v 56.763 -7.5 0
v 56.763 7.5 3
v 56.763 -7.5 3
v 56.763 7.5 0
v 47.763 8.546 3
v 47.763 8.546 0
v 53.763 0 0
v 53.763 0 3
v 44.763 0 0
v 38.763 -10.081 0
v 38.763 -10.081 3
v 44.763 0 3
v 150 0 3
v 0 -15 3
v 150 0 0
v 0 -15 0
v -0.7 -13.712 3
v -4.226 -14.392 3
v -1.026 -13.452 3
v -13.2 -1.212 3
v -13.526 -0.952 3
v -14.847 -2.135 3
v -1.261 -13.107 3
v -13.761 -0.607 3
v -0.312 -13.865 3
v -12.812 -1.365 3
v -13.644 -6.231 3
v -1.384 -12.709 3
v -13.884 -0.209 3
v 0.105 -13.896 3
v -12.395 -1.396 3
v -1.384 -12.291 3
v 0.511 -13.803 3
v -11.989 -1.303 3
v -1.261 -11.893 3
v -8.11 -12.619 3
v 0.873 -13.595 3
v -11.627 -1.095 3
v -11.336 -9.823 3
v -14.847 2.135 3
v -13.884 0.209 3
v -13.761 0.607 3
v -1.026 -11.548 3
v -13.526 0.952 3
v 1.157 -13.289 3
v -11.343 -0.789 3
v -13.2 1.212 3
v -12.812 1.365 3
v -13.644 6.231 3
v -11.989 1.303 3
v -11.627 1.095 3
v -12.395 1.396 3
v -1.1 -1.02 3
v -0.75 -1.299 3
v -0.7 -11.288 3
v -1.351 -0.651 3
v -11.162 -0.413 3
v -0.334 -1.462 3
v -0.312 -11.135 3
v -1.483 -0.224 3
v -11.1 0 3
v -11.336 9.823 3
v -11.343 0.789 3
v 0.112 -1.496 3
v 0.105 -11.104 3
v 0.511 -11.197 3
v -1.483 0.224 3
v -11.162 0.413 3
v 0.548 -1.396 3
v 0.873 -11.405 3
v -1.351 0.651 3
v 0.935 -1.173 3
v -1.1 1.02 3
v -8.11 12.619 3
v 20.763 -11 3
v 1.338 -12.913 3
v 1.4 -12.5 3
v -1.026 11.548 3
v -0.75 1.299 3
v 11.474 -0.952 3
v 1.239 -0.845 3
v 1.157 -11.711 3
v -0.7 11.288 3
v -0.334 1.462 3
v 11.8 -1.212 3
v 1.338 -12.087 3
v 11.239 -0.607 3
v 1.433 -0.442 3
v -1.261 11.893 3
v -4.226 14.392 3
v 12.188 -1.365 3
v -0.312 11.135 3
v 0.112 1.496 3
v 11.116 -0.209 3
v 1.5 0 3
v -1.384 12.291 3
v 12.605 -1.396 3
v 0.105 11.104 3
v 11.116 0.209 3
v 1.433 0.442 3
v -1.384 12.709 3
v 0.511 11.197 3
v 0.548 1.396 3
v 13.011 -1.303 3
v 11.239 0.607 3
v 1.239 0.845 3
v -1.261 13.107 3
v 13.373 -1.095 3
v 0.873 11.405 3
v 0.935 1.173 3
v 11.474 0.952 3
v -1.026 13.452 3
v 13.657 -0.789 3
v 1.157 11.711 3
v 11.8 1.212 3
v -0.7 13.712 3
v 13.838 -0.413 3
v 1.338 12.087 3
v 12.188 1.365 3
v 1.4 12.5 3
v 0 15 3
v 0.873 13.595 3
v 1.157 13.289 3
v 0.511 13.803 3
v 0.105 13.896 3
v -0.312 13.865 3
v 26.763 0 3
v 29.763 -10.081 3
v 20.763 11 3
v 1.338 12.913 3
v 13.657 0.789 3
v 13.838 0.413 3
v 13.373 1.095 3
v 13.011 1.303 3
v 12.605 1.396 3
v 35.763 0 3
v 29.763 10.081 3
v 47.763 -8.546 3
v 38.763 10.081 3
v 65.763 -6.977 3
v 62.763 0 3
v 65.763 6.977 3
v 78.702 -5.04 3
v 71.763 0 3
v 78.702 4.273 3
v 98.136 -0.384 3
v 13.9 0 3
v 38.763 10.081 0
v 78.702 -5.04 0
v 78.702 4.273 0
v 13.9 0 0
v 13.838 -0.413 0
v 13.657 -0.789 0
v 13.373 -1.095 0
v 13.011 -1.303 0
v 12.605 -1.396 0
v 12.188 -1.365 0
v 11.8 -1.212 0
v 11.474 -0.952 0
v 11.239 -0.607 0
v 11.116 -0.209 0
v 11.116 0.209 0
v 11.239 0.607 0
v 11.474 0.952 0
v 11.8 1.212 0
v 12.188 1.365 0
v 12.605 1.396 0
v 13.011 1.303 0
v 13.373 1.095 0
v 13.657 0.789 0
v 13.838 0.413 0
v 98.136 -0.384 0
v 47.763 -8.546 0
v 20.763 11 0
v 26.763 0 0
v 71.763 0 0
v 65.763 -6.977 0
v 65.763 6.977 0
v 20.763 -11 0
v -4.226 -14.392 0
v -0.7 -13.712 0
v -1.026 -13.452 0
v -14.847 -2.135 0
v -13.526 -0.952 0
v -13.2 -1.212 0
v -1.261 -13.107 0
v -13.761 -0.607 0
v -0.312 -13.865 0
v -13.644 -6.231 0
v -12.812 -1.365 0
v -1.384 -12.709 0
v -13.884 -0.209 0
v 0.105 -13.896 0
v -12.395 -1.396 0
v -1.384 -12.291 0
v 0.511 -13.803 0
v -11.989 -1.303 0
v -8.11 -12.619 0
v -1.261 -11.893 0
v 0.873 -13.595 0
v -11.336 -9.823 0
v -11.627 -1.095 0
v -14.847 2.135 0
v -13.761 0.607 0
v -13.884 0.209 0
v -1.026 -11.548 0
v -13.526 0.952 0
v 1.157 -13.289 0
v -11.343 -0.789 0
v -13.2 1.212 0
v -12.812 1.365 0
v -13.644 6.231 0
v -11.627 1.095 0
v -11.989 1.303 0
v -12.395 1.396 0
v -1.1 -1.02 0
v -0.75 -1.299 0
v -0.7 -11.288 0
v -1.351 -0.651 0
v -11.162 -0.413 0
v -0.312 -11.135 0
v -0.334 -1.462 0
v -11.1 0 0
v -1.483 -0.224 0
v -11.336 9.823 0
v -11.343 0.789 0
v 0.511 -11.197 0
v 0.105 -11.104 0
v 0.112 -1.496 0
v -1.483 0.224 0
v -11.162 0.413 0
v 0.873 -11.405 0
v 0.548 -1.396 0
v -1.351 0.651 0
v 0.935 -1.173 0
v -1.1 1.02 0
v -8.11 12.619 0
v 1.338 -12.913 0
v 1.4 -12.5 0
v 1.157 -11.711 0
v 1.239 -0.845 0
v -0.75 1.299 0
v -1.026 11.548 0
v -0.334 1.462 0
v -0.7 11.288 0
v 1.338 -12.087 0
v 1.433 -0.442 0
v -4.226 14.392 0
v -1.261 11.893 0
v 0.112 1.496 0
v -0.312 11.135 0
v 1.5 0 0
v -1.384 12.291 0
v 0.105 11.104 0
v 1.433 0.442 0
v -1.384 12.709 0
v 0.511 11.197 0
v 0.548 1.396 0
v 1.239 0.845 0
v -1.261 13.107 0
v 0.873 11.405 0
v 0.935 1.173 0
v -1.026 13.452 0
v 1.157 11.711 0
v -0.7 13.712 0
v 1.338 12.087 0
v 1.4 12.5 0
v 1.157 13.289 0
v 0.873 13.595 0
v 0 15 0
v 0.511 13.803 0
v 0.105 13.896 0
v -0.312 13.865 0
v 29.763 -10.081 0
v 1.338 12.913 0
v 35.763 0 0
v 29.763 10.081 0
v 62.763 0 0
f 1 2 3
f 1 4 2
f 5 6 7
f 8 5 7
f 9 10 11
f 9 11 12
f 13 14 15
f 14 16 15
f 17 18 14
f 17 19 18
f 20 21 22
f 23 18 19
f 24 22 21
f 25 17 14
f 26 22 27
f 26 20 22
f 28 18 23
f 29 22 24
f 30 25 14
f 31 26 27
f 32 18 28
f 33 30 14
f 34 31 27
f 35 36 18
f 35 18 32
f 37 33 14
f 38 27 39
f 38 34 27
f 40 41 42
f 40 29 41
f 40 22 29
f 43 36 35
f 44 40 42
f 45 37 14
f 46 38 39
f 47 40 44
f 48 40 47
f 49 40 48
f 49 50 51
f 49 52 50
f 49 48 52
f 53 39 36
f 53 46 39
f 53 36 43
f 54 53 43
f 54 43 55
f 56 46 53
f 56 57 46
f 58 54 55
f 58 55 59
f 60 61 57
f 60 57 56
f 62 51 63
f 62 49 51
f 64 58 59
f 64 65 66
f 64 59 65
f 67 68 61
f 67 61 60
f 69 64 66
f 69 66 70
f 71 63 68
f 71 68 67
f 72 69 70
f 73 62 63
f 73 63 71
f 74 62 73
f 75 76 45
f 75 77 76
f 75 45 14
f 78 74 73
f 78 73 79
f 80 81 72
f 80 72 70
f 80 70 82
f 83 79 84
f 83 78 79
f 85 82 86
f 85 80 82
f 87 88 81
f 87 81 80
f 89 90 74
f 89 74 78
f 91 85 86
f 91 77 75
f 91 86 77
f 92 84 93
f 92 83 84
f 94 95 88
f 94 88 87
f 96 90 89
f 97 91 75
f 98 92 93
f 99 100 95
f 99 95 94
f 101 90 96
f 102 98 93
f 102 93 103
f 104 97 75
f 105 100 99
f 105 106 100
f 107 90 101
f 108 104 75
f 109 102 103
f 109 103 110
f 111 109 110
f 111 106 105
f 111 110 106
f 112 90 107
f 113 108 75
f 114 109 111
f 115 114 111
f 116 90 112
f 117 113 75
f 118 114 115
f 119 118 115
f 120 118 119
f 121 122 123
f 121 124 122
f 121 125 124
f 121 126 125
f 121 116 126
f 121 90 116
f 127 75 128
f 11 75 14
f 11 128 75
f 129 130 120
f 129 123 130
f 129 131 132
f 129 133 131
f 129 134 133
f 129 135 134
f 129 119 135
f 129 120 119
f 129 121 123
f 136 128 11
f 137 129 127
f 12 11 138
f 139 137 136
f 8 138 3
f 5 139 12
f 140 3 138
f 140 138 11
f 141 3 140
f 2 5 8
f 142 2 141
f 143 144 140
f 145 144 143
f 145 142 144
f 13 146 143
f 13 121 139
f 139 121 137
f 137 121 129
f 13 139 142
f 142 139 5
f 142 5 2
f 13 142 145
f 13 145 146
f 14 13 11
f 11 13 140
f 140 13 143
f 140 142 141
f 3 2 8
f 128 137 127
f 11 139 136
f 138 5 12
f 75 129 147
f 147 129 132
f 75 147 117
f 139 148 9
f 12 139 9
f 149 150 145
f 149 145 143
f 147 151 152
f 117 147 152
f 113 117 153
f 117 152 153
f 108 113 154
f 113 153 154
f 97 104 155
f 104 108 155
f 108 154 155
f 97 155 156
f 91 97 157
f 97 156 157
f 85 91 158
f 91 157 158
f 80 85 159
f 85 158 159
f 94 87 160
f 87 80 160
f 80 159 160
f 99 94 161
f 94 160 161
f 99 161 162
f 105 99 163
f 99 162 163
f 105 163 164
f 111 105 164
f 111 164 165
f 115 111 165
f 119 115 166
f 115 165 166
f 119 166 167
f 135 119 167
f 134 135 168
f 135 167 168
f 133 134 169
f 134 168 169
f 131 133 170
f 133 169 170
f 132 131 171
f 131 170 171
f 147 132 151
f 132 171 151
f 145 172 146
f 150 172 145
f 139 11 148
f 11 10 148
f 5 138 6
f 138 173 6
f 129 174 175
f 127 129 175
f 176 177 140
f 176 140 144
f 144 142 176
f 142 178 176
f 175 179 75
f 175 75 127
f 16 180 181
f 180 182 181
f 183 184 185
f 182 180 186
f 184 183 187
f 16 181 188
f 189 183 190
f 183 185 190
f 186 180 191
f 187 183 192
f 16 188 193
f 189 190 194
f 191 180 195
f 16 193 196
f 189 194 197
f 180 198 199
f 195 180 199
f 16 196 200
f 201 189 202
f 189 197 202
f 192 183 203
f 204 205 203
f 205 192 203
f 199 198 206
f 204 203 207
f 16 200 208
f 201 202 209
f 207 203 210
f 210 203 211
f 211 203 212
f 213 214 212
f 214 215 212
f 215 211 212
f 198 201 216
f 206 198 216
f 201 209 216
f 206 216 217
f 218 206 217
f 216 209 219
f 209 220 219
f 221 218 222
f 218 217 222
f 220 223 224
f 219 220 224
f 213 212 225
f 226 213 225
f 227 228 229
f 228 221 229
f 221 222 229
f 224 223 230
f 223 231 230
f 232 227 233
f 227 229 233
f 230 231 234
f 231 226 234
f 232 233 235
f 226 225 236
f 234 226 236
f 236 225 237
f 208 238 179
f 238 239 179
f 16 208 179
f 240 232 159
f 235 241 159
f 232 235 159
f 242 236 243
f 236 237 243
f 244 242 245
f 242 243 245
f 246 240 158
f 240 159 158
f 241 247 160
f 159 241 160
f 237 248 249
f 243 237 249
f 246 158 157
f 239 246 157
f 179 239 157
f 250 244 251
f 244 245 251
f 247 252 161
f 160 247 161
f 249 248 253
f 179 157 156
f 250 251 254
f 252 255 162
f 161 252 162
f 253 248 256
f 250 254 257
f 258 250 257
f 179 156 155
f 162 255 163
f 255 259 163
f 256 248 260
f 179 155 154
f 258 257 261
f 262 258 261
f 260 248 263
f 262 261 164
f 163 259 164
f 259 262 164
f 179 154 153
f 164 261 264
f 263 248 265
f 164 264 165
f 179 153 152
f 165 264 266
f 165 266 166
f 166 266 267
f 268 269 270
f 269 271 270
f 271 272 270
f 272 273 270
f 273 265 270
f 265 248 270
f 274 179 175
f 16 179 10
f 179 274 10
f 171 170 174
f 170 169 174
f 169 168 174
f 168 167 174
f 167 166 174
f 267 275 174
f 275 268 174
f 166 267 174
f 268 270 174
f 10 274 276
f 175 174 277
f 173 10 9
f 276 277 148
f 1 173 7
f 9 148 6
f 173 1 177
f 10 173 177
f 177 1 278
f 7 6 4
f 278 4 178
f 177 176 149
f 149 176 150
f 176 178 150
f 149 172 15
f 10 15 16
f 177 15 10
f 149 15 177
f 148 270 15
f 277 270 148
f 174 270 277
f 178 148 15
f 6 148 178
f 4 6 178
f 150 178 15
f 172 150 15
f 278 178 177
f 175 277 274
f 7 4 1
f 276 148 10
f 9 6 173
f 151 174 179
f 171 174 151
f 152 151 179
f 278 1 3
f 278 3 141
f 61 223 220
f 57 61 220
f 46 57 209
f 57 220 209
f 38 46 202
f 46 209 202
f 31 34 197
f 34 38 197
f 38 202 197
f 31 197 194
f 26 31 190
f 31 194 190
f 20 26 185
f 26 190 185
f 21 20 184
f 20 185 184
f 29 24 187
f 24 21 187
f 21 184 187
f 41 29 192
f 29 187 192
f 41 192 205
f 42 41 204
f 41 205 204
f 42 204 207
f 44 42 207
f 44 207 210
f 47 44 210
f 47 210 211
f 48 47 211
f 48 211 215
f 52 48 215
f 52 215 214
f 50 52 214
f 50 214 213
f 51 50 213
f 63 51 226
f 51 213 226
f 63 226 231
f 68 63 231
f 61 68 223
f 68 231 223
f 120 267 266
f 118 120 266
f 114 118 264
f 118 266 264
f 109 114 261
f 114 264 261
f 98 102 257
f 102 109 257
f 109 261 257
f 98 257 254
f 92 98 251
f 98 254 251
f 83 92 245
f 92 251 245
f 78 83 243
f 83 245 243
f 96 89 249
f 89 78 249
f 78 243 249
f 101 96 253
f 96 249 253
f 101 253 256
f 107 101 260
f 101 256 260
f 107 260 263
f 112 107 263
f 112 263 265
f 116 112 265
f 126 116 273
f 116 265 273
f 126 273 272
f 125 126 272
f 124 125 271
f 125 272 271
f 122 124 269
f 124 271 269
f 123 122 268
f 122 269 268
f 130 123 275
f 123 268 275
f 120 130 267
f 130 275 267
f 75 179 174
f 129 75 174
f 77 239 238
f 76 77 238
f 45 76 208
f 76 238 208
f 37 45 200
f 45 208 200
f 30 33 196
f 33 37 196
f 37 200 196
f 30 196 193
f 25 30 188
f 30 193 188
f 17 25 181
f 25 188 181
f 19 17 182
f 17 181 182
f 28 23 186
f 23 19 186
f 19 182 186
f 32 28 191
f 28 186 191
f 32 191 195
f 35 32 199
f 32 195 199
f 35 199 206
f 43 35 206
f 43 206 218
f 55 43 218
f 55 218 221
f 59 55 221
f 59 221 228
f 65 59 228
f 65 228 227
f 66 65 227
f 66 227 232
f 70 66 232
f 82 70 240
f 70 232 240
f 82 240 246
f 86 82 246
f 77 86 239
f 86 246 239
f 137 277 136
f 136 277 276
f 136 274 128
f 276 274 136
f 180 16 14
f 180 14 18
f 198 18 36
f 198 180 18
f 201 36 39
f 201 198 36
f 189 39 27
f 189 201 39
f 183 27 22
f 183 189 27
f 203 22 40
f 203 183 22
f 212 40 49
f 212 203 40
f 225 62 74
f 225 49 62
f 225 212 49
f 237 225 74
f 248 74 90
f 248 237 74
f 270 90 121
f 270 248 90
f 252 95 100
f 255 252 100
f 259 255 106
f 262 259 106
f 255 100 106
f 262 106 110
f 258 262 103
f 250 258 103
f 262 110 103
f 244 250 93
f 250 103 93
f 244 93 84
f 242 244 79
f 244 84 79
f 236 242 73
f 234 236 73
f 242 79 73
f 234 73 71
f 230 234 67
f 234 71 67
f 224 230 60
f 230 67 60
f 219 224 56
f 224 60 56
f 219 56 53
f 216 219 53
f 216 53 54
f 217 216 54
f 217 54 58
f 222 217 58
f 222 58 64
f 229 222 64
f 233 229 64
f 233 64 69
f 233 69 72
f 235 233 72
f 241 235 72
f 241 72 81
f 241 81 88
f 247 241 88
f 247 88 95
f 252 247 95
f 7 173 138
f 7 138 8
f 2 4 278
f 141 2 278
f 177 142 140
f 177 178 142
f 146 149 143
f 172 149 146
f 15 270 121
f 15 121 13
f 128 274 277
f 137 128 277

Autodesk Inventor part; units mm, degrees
ref_plane "YZ Plane" through (0, 0, 0) normal (1, 0, 0) x (0, 1, 0)
ref_plane "XZ Plane" through (0, 0, 0) normal (0, 1, 0) x (-1, 0, 0)
ref_plane "XY Plane" through (0, 0, 0) normal (0, 0, 1) x (1, 0, 0)
sketch "Sketch1" plane through (0, 0, 0) normal (0, 0, 1) x (1, 0, 0)
  circle A0 centre (0, 0) radius 15
  circle A1 centre (-12.5, 0) radius 1.4
  circle A2 centre (0, -12.5) radius 1.4
  circle A3 centre (12.5, 0) radius 1.4
  circle A4 centre (0, 12.5) radius 1.4
  arc A5 (139.8092, 1.0191) -> (139.8092, -1.0191) centre (150, 0) ccw
  line L0 (0, 15) -> (150, 0)
  line L1 (0, -15) -> (150, 0)
  line L2 (29.7634, 10.0809) -> (35.7634, 10.0809)
  line L3 (35.7634, 10.0809) -> (35.7634, -10.0809)
  line L4 (35.7634, -10.0809) -> (29.7634, -10.0809)
  line L5 (29.7634, -10.0809) -> (29.7634, 10.0809)
  line L6 (29.7634, 10.0809) -> (35.7634, -10.0809) construction
  line L7 (35.7634, 10.0809) -> (29.7634, -10.0809) construction
  line L8 (38.7634, 10.0809) -> (44.7634, 10.0809)
  line L9 (44.7634, 10.0809) -> (44.7634, -10.0809)
  line L10 (44.7634, -10.0809) -> (38.7634, -10.0809)
  line L11 (38.7634, -10.0809) -> (38.7634, 10.0809)
  line L12 (38.7634, 10.0809) -> (44.7634, -10.0809) construction
  line L13 (44.7634, 10.0809) -> (38.7634, -10.0809) construction
  line L14 (47.7634, 8.546) -> (53.7634, 8.546)
  line L15 (53.7634, 8.546) -> (53.7634, -8.546)
  line L16 (53.7634, -8.546) -> (47.7634, -8.546)
  line L17 (47.7634, -8.546) -> (47.7634, 8.546)
  line L18 (47.7634, 8.546) -> (53.7634, -8.546) construction
  line L19 (53.7634, 8.546) -> (47.7634, -8.546) construction
  line L20 (62.7634, 7.5) -> (56.7634, 7.5)
  line L21 (56.7634, 7.5) -> (56.7634, -7.5)
  line L22 (56.7634, -7.5) -> (62.7634, -7.5)
  line L23 (62.7634, -7.5) -> (62.7634, 7.5)
  line L24 (62.7634, 7.5) -> (56.7634, -7.5) construction
  line L25 (56.7634, 7.5) -> (62.7634, -7.5) construction
  line L26 (71.7634, 6.9773) -> (65.7634, 6.9773)
  line L27 (65.7634, 6.9773) -> (65.7634, -6.9773)
  line L28 (65.7634, -6.9773) -> (71.7634, -6.9773)
  line L29 (71.7634, -6.9773) -> (71.7634, 6.9773)
  line L30 (71.7634, 6.9773) -> (65.7634, -6.9773) construction
  line L31 (65.7634, 6.9773) -> (71.7634, -6.9773) construction
  line L32 (20.7634, 11) -> (26.7634, 11)
  line L33 (26.7634, 11) -> (26.7634, -11)
  line L34 (26.7634, -11) -> (20.7634, -11)
  line L35 (20.7634, -11) -> (20.7634, 11)
  line L36 (20.7634, 11) -> (26.7634, -11) construction
  line L37 (26.7634, 11) -> (20.7634, -11) construction
  line L38 (20.7634, 11) -> (26.7634, 0)
  line L39 (20.7634, -11) -> (26.7634, 0)
  line L40 (29.7634, 10.0809) -> (35.7634, 0)
  line L41 (29.7634, -10.0809) -> (35.7634, 0)
  line L42 (38.7634, 10.0809) -> (44.7634, 0)
  line L43 (38.7634, -10.0809) -> (44.7634, 0)
  line L44 (47.7634, 8.546) -> (53.7634, 0)
  line L45 (47.7634, -8.546) -> (53.7634, 0)
  line L46 (56.7634, 7.5) -> (62.7634, 0)
  line L47 (56.7634, -7.5) -> (62.7634, 0)
  line L48 (65.7634, 6.9773) -> (71.7634, 0)
  line L49 (65.7634, -6.9773) -> (71.7634, 0)
  line L50 (78.7015, 4.273) -> (78.7015, -5.0405)
  line L51 (78.7015, -5.0405) -> (98.1361, -0.3837)
  line L52 (98.1361, -0.3837) -> (78.7015, 4.273)
  point P0 (32.7634, 0)
  point P1 (41.7634, 0)
  point P2 (50.7634, 0)
  point P3 (59.7634, 0)
  point P4 (68.7634, 0)
  point P5 (23.7634, 0)
  dimension "d0" = 30
  dimension "d1" = 2.8
  dimension "d2" = 12.5
  dimension "d5" = 360
  dimension "d7" = 150
  dimension "d8" = 9
  dimension "d9" = 9
  dimension "d10" = 9
  dimension "d11" = 9
  dimension "d12" = 6
  dimension "d13" = 6
  dimension "d14" = 6
  dimension "d15" = 6
  dimension "d16" = 6
  dimension "d17" = 6
  dimension "d18" = 9
  dimension "d19" = 22
extrude "Extrusion1" add sketch "Sketch1" along normal blind 3 contours L0 A0 L1 | L0 A5 L1 A0 | L0 L1 A5 | L2 L3 L40 | L41 L3 L4 | L8 L9 L42 | L43 L9 L10 | L14 L15 L44 | L45 L15 L16 | L23 L46 L20 | L23 L22 L47 | L29 L48 L26 | L29 L28 L49 | L32 L33 L38 | L39 L33 L34
sketch "Sketch2" plane through (0, 0, 3) normal (0, 0, 1) x (1, 0, 0)
  circle A0 centre (0, 0) radius 1.5
  dimension "d22" = 3
extrude "Extrusion2" cut sketch "Sketch2" against normal through all
properties part number "link2"
